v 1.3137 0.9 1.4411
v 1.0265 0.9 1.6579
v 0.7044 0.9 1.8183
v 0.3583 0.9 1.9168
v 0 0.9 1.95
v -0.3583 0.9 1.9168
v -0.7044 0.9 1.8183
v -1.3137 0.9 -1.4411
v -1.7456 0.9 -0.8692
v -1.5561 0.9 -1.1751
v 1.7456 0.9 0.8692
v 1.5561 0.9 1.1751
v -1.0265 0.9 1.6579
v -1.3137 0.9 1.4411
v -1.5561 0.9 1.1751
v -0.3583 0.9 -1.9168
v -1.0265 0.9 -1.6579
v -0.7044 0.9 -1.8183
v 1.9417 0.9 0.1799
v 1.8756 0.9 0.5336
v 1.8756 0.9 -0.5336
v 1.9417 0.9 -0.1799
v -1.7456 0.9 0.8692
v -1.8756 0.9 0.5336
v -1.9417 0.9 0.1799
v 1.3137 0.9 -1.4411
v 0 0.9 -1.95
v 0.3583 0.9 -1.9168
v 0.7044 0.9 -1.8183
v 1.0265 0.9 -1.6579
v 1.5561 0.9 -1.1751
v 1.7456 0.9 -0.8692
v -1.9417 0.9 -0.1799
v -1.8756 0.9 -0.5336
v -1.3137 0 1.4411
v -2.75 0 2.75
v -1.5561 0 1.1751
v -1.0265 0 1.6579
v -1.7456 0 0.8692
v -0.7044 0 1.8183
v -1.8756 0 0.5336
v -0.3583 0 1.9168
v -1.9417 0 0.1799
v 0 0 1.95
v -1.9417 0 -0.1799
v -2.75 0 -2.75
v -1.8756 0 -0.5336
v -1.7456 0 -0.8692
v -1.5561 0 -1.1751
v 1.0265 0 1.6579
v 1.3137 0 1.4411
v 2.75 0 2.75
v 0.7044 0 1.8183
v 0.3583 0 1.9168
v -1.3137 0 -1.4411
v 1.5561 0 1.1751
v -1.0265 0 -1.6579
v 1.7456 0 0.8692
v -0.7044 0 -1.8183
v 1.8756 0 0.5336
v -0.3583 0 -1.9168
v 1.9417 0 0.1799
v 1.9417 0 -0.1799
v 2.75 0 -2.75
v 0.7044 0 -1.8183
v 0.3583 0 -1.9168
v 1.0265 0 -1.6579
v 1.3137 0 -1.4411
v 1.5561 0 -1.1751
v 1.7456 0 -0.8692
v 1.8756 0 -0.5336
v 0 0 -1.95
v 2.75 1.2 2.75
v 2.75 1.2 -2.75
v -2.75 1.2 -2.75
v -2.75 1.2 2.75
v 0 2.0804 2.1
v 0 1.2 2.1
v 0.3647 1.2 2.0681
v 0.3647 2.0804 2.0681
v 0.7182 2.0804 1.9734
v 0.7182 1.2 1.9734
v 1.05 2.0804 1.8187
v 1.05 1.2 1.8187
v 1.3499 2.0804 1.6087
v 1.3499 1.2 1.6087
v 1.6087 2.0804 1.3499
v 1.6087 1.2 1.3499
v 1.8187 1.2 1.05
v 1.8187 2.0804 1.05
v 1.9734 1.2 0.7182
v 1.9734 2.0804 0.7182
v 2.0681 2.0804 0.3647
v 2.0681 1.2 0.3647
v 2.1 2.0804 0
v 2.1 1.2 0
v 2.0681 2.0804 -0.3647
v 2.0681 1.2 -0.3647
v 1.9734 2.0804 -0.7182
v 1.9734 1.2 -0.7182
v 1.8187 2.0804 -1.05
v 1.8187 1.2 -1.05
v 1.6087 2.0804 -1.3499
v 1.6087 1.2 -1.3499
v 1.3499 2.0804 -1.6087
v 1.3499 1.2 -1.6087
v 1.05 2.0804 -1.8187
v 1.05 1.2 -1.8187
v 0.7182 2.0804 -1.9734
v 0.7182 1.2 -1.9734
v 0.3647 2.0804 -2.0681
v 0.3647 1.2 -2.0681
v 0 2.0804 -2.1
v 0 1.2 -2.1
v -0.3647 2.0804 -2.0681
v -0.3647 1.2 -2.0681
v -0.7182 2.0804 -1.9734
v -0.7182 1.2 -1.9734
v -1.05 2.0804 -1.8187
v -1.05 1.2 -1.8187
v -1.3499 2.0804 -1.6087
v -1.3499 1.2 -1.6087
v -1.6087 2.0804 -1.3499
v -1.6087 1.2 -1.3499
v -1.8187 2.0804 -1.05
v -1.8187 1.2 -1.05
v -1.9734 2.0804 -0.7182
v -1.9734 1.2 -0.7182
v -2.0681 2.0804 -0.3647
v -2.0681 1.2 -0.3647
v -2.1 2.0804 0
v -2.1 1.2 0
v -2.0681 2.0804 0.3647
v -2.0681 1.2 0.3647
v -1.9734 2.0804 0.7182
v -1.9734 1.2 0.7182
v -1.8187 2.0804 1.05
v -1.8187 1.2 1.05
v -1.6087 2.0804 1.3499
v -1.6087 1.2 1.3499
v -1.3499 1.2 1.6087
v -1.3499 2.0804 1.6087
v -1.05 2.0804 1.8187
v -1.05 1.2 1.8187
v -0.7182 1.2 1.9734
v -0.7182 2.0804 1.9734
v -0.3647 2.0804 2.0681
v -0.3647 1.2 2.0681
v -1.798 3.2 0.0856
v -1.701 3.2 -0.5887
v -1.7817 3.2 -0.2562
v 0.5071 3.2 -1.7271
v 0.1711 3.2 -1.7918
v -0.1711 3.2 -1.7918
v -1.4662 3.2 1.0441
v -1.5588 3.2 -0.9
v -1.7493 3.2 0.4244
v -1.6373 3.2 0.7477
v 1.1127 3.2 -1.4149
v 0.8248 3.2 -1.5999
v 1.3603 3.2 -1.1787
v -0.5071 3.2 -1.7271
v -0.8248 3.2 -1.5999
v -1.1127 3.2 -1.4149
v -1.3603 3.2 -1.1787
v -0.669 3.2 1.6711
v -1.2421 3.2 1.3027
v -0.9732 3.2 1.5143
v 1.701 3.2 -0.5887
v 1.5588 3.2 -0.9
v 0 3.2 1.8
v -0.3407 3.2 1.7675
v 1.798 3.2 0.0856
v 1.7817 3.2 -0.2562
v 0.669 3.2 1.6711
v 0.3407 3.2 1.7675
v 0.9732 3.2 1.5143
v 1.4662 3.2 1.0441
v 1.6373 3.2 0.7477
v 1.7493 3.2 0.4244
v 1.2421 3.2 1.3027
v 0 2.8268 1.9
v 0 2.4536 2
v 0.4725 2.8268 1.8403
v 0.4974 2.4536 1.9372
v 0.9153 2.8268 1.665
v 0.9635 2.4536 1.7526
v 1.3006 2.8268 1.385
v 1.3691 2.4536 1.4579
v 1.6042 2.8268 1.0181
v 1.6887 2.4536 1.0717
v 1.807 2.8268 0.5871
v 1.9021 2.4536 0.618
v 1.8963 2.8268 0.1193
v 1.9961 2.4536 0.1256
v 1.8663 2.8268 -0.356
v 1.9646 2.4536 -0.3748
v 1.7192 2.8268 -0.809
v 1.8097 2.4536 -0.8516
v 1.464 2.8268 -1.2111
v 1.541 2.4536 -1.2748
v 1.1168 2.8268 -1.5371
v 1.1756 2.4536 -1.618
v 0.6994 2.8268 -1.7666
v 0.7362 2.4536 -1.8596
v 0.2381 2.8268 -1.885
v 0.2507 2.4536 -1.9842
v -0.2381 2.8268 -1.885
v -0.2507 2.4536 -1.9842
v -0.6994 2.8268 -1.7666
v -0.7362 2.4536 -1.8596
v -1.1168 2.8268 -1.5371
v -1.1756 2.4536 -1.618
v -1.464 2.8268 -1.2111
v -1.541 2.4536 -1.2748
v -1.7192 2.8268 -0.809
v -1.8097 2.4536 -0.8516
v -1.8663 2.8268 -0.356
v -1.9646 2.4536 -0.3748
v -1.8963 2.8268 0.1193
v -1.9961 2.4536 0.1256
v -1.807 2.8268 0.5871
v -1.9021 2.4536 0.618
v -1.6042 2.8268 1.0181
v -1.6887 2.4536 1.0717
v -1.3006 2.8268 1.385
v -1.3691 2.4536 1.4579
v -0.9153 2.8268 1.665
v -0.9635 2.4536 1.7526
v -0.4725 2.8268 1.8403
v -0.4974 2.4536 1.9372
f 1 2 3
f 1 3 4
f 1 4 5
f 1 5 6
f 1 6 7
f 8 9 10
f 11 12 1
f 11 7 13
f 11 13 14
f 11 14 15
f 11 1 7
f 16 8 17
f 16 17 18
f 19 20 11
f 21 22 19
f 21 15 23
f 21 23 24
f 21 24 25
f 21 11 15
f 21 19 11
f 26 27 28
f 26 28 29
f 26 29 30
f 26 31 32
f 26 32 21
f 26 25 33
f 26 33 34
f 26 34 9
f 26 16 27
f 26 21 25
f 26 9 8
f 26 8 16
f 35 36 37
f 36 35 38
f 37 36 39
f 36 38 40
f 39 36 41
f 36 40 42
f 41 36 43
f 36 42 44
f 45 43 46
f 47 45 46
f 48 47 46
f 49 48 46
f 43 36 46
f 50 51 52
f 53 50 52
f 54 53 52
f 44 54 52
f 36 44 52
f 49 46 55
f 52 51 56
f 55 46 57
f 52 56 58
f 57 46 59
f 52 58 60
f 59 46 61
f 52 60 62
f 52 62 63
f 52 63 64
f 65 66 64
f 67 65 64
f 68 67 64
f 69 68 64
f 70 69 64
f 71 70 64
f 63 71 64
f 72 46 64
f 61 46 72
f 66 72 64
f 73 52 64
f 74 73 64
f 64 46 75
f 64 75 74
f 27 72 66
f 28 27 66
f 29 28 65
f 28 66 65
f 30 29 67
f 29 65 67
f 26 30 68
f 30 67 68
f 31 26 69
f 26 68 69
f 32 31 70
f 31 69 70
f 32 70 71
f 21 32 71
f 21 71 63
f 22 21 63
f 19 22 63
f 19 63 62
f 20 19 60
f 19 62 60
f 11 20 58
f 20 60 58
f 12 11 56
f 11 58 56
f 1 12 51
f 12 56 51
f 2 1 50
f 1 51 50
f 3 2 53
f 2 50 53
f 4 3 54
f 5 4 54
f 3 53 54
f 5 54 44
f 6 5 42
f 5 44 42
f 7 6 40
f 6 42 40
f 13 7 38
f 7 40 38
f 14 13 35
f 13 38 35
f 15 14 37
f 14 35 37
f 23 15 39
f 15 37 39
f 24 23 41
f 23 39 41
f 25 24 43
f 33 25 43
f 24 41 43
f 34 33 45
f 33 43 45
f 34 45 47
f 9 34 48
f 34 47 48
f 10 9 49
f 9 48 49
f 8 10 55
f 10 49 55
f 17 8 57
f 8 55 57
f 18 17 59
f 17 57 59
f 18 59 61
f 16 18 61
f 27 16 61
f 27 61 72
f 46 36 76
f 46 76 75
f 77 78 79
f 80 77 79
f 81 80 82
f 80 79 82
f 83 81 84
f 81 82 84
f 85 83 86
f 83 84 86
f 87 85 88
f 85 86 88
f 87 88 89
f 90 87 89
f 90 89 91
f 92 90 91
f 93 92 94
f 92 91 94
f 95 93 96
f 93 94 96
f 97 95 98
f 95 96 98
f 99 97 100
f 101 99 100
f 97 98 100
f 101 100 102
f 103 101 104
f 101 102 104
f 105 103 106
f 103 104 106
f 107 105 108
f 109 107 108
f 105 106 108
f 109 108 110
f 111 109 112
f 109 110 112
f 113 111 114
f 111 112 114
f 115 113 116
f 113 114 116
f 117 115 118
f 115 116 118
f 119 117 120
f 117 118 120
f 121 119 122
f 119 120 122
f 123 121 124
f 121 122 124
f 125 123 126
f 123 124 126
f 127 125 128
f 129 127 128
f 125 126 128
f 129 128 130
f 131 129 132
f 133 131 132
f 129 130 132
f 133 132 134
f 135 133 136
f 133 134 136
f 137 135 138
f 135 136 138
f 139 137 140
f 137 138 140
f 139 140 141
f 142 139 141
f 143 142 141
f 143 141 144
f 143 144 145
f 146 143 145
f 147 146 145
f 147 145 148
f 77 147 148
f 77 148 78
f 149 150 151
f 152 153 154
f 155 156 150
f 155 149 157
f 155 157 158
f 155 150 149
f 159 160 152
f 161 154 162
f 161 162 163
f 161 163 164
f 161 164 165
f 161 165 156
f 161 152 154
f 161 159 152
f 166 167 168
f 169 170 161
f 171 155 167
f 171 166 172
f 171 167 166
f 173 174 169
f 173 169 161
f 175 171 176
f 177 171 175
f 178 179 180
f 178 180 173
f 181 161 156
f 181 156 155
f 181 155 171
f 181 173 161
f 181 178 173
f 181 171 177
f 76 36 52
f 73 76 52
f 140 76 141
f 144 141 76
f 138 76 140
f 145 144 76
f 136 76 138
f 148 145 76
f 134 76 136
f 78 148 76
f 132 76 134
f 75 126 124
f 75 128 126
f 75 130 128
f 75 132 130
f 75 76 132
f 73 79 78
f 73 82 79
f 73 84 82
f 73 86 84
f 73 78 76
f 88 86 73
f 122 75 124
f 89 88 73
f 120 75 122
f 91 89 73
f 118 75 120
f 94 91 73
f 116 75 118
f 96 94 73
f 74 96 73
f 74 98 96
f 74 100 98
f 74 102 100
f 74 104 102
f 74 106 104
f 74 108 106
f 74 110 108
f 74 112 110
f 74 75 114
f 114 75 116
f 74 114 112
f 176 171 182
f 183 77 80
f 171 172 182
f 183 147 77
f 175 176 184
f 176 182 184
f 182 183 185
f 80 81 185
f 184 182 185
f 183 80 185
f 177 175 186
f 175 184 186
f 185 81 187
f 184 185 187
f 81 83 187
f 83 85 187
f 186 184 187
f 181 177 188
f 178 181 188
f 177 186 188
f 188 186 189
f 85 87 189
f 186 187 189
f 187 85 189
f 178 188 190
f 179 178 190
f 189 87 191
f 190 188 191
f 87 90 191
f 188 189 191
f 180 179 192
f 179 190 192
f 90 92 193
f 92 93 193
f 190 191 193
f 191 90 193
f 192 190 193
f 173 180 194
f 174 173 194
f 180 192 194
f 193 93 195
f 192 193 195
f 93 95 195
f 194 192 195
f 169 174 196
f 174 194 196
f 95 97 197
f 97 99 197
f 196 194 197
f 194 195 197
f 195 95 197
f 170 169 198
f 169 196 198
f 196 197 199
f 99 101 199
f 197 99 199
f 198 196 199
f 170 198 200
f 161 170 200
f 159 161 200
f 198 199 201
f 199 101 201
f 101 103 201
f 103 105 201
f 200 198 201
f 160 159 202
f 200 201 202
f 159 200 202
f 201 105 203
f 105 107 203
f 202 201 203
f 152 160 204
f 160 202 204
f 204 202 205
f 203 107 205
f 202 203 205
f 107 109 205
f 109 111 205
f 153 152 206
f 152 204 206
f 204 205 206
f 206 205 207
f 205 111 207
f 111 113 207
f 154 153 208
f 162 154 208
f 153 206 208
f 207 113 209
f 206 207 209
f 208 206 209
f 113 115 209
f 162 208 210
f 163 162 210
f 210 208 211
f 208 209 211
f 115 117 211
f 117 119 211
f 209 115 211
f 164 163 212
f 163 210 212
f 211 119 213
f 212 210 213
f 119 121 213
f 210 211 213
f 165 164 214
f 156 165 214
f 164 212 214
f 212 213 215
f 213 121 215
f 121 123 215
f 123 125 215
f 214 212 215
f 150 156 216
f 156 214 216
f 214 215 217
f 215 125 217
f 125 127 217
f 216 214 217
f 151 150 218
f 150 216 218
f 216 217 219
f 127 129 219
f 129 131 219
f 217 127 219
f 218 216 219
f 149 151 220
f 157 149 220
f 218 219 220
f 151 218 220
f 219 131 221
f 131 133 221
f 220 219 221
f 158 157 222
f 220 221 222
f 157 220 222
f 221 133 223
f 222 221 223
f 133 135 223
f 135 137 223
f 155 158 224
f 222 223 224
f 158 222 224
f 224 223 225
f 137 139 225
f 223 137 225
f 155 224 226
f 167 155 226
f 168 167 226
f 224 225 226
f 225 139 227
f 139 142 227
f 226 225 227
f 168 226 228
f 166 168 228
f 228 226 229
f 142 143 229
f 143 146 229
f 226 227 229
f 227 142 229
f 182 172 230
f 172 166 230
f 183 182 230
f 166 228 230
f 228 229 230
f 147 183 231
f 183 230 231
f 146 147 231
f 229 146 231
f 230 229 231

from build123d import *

# Parameters (mm, degrees)
SKETCH1_W           = 5.5
SKETCH1_H           = 5.5
BOSS_EXTRUDE1_DEPTH = 1.2
SKETCH2_R           = 2.1
BOSS_EXTRUDE2_DEPTH = 2
SKETCH3_R           = 1.95
CUT_EXTRUDE1_DEPTH  = 0.9
CHAMFER2_SIZE       = 0.3
CHAMFER2_SIZE2      = 1.119615242


with BuildPart() as part:
    # Sketch1 → Boss-Extrude1 (new body)
    with BuildSketch(Plane(origin=(0, 0, 0), x_dir=(1, 0, 0), z_dir=(0, 1, 0))):
        Rectangle(SKETCH1_W, SKETCH1_H)
    extrude(amount=BOSS_EXTRUDE1_DEPTH)

    # Sketch2 → Boss-Extrude2 (add)
    with BuildSketch(Plane(origin=(0, 1.2, 0), x_dir=(1, 0, 0), z_dir=(0, 1, 0))):
        with Locations(Location((0, 0, 0), (0, 0, 270))):
            Circle(SKETCH2_R)
    extrude(amount=BOSS_EXTRUDE2_DEPTH)

    # Sketch3 → Cut-Extrude1 (cut)
    with BuildSketch(Plane.XZ):
        with Locations(Location((0, 0, 0), (0, 0, 270))):
            Circle(SKETCH3_R)
    extrude(amount=-CUT_EXTRUDE1_DEPTH, mode=Mode.SUBTRACT)

    # Chamfer2
    chamfer2_edges = [part.edges().sort_by_distance(p)[0] for p in [
        (0, 3.2, -2.1),
    ]]
    chamfer2_side = [part.faces().sort_by_distance(p)[0] for p in [
        (0, 3.2, 0),
    ]]
    chamfer(chamfer2_edges, length=CHAMFER2_SIZE, length2=CHAMFER2_SIZE2, reference=chamfer2_side[0])


solid = part.part
